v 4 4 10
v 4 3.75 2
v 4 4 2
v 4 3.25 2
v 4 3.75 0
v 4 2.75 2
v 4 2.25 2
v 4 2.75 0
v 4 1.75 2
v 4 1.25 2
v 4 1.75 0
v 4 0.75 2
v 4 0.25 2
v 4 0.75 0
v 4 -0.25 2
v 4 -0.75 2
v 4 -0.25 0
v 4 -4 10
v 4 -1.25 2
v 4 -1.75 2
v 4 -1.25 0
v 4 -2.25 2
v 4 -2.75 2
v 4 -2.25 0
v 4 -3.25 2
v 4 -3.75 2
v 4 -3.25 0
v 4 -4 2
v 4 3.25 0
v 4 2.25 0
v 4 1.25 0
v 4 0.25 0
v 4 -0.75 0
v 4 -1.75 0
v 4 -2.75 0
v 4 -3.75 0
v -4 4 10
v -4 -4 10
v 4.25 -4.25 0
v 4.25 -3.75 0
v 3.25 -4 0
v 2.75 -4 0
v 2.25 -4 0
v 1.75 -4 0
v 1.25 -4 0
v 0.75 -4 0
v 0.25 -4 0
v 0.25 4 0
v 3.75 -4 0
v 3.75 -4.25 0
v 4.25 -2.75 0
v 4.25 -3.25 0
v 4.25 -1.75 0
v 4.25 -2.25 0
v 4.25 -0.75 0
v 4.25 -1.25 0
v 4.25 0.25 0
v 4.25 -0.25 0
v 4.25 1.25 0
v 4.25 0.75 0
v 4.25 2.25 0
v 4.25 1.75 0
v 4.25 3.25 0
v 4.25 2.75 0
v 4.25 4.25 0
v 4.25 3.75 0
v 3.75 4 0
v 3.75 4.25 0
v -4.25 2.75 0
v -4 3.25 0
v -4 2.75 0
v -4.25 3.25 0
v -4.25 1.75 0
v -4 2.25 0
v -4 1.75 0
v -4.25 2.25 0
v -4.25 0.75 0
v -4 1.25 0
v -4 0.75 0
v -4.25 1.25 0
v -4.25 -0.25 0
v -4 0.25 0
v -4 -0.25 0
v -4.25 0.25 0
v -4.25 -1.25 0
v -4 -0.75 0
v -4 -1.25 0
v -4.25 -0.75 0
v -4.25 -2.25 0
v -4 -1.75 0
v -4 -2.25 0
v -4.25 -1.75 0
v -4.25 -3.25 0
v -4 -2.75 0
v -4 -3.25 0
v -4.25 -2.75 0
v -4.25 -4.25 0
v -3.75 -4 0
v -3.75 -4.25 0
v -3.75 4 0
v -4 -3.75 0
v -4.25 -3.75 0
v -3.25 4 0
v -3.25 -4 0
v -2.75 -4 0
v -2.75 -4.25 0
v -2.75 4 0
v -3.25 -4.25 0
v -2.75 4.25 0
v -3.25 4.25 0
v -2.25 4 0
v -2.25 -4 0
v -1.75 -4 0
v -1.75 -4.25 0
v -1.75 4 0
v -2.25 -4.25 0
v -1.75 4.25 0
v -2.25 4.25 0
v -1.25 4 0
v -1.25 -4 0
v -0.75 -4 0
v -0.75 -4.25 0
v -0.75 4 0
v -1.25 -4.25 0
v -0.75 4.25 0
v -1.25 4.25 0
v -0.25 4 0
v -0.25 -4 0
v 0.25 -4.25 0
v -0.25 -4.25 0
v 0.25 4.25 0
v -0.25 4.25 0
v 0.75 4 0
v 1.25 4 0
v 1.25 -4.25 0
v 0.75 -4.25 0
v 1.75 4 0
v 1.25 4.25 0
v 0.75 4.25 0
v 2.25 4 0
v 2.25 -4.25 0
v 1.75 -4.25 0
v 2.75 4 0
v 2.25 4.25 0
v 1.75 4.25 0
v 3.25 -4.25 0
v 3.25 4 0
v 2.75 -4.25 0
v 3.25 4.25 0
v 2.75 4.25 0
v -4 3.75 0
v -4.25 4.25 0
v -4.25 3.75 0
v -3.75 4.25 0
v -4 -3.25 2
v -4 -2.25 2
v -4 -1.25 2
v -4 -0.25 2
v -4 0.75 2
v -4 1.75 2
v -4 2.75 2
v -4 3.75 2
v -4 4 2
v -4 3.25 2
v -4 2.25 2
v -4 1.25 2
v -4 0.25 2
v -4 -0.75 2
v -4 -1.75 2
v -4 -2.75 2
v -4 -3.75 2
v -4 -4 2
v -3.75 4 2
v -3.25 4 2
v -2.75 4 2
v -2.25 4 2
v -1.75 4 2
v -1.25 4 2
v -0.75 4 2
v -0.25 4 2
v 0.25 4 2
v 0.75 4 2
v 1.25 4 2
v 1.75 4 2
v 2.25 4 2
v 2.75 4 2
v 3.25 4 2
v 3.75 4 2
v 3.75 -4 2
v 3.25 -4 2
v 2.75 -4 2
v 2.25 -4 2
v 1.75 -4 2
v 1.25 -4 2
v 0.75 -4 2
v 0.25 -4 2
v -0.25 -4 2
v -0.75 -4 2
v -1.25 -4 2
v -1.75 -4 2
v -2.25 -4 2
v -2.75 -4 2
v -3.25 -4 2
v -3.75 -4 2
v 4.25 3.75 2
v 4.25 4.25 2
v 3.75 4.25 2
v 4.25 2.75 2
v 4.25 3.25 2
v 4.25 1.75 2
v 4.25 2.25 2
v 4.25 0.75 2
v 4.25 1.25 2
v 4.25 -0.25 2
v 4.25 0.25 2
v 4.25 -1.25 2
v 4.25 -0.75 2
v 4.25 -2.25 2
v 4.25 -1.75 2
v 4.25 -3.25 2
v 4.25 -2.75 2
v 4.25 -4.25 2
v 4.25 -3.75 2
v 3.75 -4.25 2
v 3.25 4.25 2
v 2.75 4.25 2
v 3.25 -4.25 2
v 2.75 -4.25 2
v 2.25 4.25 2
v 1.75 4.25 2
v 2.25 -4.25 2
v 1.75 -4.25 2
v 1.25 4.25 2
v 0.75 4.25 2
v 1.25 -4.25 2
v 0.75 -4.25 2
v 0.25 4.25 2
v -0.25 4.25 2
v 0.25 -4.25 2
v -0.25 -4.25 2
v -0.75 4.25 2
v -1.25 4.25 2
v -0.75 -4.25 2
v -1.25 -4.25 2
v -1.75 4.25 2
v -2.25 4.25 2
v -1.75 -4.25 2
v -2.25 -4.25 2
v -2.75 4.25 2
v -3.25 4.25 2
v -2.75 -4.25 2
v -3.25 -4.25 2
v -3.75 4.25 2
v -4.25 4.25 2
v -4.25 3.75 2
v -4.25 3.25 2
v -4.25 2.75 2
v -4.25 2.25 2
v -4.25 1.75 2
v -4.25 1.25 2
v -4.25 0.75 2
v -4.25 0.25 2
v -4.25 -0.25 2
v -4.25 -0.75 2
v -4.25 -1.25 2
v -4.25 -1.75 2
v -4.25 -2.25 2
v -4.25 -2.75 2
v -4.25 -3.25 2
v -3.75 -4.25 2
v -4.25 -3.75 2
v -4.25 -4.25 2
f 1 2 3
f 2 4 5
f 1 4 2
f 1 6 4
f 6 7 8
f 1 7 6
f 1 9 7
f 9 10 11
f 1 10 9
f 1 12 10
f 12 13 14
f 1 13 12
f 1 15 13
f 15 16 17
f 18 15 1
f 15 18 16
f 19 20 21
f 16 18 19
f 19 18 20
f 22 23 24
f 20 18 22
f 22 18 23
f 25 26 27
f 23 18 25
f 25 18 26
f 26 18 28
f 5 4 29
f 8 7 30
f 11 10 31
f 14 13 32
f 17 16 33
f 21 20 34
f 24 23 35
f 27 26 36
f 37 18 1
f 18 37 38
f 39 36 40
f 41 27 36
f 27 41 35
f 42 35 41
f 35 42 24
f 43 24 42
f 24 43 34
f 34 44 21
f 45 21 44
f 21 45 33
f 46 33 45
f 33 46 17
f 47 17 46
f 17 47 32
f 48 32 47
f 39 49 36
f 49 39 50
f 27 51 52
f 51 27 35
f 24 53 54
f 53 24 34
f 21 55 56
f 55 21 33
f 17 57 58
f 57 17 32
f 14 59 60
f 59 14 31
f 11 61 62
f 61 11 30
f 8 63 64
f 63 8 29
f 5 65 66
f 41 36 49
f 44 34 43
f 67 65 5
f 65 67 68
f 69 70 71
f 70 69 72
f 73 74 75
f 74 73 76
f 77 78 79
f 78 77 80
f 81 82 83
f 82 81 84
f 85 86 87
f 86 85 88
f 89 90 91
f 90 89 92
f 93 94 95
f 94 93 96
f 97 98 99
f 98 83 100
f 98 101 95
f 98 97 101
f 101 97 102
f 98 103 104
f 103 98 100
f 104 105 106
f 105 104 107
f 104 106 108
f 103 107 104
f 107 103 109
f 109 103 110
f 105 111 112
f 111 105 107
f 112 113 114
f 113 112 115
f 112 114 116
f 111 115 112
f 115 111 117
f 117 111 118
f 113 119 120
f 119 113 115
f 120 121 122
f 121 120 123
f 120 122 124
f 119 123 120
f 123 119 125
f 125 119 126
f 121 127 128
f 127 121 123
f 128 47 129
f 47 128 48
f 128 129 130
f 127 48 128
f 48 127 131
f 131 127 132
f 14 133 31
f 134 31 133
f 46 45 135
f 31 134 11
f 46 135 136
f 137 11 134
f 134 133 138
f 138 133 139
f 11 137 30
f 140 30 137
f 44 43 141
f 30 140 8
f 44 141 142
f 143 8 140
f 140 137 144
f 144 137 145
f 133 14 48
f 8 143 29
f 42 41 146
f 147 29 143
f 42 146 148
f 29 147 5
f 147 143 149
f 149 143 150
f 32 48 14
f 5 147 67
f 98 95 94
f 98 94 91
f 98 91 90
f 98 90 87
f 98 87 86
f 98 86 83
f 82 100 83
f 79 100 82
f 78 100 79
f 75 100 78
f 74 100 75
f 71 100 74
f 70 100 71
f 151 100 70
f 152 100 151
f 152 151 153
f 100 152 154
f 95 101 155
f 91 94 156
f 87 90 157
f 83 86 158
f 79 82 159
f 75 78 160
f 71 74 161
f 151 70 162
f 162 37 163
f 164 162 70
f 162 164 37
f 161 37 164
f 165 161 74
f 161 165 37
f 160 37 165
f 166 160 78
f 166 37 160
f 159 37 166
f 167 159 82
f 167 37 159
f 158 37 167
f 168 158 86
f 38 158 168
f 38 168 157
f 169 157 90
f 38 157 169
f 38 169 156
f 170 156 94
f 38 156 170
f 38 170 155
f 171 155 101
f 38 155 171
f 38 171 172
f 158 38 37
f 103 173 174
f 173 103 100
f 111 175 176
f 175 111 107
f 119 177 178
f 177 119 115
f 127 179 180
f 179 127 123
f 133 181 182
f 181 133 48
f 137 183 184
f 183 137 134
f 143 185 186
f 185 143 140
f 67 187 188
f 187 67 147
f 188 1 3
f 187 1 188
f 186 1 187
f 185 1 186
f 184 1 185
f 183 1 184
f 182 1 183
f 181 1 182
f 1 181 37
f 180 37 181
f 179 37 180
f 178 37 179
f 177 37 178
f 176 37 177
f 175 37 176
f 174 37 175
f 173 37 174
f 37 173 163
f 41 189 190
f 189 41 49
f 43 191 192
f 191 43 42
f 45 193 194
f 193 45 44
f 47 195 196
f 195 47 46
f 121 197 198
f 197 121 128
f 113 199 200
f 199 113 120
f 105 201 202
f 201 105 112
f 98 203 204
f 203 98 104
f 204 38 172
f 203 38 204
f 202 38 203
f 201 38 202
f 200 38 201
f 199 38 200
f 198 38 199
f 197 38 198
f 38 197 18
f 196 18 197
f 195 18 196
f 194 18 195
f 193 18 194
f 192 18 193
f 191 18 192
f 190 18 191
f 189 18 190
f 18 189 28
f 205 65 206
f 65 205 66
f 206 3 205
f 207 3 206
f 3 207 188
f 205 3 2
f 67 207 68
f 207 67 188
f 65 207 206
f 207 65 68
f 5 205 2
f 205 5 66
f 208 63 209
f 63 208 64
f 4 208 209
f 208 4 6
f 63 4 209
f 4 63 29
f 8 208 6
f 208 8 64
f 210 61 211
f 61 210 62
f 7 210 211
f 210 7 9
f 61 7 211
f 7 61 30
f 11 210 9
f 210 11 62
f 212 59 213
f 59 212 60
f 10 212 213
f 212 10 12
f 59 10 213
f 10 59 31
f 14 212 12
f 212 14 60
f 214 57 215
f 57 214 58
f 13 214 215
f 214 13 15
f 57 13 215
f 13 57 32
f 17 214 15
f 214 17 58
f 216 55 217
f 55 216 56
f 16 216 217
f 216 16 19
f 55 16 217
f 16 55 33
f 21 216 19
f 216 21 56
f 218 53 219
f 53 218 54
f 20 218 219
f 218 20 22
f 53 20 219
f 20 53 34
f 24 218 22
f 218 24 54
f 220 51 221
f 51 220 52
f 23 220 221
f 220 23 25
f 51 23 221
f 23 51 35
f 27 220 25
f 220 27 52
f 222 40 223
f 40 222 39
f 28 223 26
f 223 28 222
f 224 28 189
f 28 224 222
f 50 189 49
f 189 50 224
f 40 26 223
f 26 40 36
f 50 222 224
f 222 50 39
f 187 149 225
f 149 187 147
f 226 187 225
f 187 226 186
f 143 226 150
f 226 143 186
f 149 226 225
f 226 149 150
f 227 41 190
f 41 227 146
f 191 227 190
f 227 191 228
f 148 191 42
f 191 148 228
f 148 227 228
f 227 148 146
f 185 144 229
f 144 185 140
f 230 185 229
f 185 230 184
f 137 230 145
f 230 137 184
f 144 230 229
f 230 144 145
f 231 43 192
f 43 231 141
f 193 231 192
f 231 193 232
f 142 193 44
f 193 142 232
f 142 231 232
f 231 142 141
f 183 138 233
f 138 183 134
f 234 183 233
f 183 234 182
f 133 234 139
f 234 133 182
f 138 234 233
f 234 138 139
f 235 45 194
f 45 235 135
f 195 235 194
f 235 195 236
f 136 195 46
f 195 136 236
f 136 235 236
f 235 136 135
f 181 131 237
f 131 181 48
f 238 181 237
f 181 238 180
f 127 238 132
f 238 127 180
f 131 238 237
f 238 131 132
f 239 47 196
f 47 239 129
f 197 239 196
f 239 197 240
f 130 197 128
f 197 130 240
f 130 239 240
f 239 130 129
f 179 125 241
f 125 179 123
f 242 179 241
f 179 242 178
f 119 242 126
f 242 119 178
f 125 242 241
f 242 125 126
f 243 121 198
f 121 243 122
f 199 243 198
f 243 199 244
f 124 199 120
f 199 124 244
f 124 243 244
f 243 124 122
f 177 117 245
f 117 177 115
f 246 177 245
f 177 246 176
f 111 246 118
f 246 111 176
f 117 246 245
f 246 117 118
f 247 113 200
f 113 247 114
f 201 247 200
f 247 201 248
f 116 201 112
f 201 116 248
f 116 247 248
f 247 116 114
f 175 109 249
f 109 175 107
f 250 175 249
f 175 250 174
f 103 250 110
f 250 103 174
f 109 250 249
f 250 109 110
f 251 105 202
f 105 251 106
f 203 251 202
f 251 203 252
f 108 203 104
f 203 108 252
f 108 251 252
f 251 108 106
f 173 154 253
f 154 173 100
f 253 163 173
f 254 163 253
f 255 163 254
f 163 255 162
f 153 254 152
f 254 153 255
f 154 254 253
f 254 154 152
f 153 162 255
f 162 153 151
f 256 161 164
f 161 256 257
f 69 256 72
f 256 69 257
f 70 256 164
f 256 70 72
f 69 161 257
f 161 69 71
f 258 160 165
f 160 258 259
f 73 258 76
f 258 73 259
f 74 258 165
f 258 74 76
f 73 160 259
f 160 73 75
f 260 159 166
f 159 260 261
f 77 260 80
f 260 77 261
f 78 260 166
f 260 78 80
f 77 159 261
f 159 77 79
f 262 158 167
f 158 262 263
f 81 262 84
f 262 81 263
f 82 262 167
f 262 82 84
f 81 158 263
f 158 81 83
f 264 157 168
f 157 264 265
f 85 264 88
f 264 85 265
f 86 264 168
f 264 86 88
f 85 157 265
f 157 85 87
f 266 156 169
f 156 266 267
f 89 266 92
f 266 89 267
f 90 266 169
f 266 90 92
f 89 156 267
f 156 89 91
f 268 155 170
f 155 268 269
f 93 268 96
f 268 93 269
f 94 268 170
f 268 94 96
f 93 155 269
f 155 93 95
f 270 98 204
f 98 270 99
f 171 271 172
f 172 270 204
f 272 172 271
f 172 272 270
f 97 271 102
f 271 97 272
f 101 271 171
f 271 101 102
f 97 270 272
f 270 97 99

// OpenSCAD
translate([0, 0, 5]) color([0,1,0,0.9]) cube([8, 8, 10], center=true);
translate([4.0, 4.0, 1]) color([1,0,0]) cube([0.5, 0.5, 2], center=true);
translate([4.0, 3.0, 1]) color([1,0,0]) cube([0.5, 0.5, 2], center=true);
translate([4.0, 2.0, 1]) color([1,0,0]) cube([0.5, 0.5, 2], center=true);
translate([4.0, 1.0, 1]) color([1,0,0]) cube([0.5, 0.5, 2], center=true);
translate([4.0, 0.0, 1]) color([1,0,0]) cube([0.5, 0.5, 2], center=true);
translate([4.0, -1.0, 1]) color([1,0,0]) cube([0.5, 0.5, 2], center=true);
translate([4.0, -2.0, 1]) color([1,0,0]) cube([0.5, 0.5, 2], center=true);
translate([4.0, -3.0, 1]) color([1,0,0]) cube([0.5, 0.5, 2], center=true);
translate([4.0, -4.0, 1]) color([1,0,0]) cube([0.5, 0.5, 2], center=true);
translate([3.0, 4.0, 1]) color([1,0,0]) cube([0.5, 0.5, 2], center=true);
translate([3.0, 3.0, 1]) color([1,0,0]) cube([0.5, 0.5, 2], center=true);
translate([3.0, 2.0, 1]) color([1,0,0]) cube([0.5, 0.5, 2], center=true);
translate([3.0, 1.0, 1]) color([1,0,0]) cube([0.5, 0.5, 2], center=true);
translate([3.0, 0.0, 1]) color([1,0,0]) cube([0.5, 0.5, 2], center=true);
translate([3.0, -1.0, 1]) color([1,0,0]) cube([0.5, 0.5, 2], center=true);
translate([3.0, -2.0, 1]) color([1,0,0]) cube([0.5, 0.5, 2], center=true);
translate([3.0, -3.0, 1]) color([1,0,0]) cube([0.5, 0.5, 2], center=true);
translate([3.0, -4.0, 1]) color([1,0,0]) cube([0.5, 0.5, 2], center=true);
translate([2.0, 4.0, 1]) color([1,0,0]) cube([0.5, 0.5, 2], center=true);
translate([2.0, 3.0, 1]) color([1,0,0]) cube([0.5, 0.5, 2], center=true);
translate([2.0, 2.0, 1]) color([1,0,0]) cube([0.5, 0.5, 2], center=true);
translate([2.0, 1.0, 1]) color([1,0,0]) cube([0.5, 0.5, 2], center=true);
translate([2.0, 0.0, 1]) color([1,0,0]) cube([0.5, 0.5, 2], center=true);
translate([2.0, -1.0, 1]) color([1,0,0]) cube([0.5, 0.5, 2], center=true);
translate([2.0, -2.0, 1]) color([1,0,0]) cube([0.5, 0.5, 2], center=true);
translate([2.0, -3.0, 1]) color([1,0,0]) cube([0.5, 0.5, 2], center=true);
translate([2.0, -4.0, 1]) color([1,0,0]) cube([0.5, 0.5, 2], center=true);
translate([1.0, 4.0, 1]) color([1,0,0]) cube([0.5, 0.5, 2], center=true);
translate([1.0, 3.0, 1]) color([1,0,0]) cube([0.5, 0.5, 2], center=true);
translate([1.0, 2.0, 1]) color([1,0,0]) cube([0.5, 0.5, 2], center=true);
translate([1.0, 1.0, 1]) color([1,0,0]) cube([0.5, 0.5, 2], center=true);
translate([1.0, 0.0, 1]) color([1,0,0]) cube([0.5, 0.5, 2], center=true);
translate([1.0, -1.0, 1]) color([1,0,0]) cube([0.5, 0.5, 2], center=true);
translate([1.0, -2.0, 1]) color([1,0,0]) cube([0.5, 0.5, 2], center=true);
translate([1.0, -3.0, 1]) color([1,0,0]) cube([0.5, 0.5, 2], center=true);
translate([1.0, -4.0, 1]) color([1,0,0]) cube([0.5, 0.5, 2], center=true);
translate([0.0, 4.0, 1]) color([1,0,0]) cube([0.5, 0.5, 2], center=true);
translate([0.0, 3.0, 1]) color([1,0,0]) cube([0.5, 0.5, 2], center=true);
translate([0.0, 2.0, 1]) color([1,0,0]) cube([0.5, 0.5, 2], center=true);
translate([0.0, 1.0, 1]) color([1,0,0]) cube([0.5, 0.5, 2], center=true);
translate([0.0, 0.0, 1]) color([1,0,0]) cube([0.5, 0.5, 2], center=true);
translate([0.0, -1.0, 1]) color([1,0,0]) cube([0.5, 0.5, 2], center=true);
translate([0.0, -2.0, 1]) color([1,0,0]) cube([0.5, 0.5, 2], center=true);
translate([0.0, -3.0, 1]) color([1,0,0]) cube([0.5, 0.5, 2], center=true);
translate([0.0, -4.0, 1]) color([1,0,0]) cube([0.5, 0.5, 2], center=true);
translate([-1.0, 4.0, 1]) color([1,0,0]) cube([0.5, 0.5, 2], center=true);
translate([-1.0, 3.0, 1]) color([1,0,0]) cube([0.5, 0.5, 2], center=true);
translate([-1.0, 2.0, 1]) color([1,0,0]) cube([0.5, 0.5, 2], center=true);
translate([-1.0, 1.0, 1]) color([1,0,0]) cube([0.5, 0.5, 2], center=true);
translate([-1.0, 0.0, 1]) color([1,0,0]) cube([0.5, 0.5, 2], center=true);
translate([-1.0, -1.0, 1]) color([1,0,0]) cube([0.5, 0.5, 2], center=true);
translate([-1.0, -2.0, 1]) color([1,0,0]) cube([0.5, 0.5, 2], center=true);
translate([-1.0, -3.0, 1]) color([1,0,0]) cube([0.5, 0.5, 2], center=true);
translate([-1.0, -4.0, 1]) color([1,0,0]) cube([0.5, 0.5, 2], center=true);
translate([-2.0, 4.0, 1]) color([1,0,0]) cube([0.5, 0.5, 2], center=true);
translate([-2.0, 3.0, 1]) color([1,0,0]) cube([0.5, 0.5, 2], center=true);
translate([-2.0, 2.0, 1]) color([1,0,0]) cube([0.5, 0.5, 2], center=true);
translate([-2.0, 1.0, 1]) color([1,0,0]) cube([0.5, 0.5, 2], center=true);
translate([-2.0, 0.0, 1]) color([1,0,0]) cube([0.5, 0.5, 2], center=true);
translate([-2.0, -1.0, 1]) color([1,0,0]) cube([0.5, 0.5, 2], center=true);
translate([-2.0, -2.0, 1]) color([1,0,0]) cube([0.5, 0.5, 2], center=true);
translate([-2.0, -3.0, 1]) color([1,0,0]) cube([0.5, 0.5, 2], center=true);
translate([-2.0, -4.0, 1]) color([1,0,0]) cube([0.5, 0.5, 2], center=true);
translate([-3.0, 4.0, 1]) color([1,0,0]) cube([0.5, 0.5, 2], center=true);
translate([-3.0, 3.0, 1]) color([1,0,0]) cube([0.5, 0.5, 2], center=true);
translate([-3.0, 2.0, 1]) color([1,0,0]) cube([0.5, 0.5, 2], center=true);
translate([-3.0, 1.0, 1]) color([1,0,0]) cube([0.5, 0.5, 2], center=true);
translate([-3.0, 0.0, 1]) color([1,0,0]) cube([0.5, 0.5, 2], center=true);
translate([-3.0, -1.0, 1]) color([1,0,0]) cube([0.5, 0.5, 2], center=true);
translate([-3.0, -2.0, 1]) color([1,0,0]) cube([0.5, 0.5, 2], center=true);
translate([-3.0, -3.0, 1]) color([1,0,0]) cube([0.5, 0.5, 2], center=true);
translate([-3.0, -4.0, 1]) color([1,0,0]) cube([0.5, 0.5, 2], center=true);
translate([-4.0, 4.0, 1]) color([1,0,0]) cube([0.5, 0.5, 2], center=true);
translate([-4.0, 3.0, 1]) color([1,0,0]) cube([0.5, 0.5, 2], center=true);
translate([-4.0, 2.0, 1]) color([1,0,0]) cube([0.5, 0.5, 2], center=true);
translate([-4.0, 1.0, 1]) color([1,0,0]) cube([0.5, 0.5, 2], center=true);
translate([-4.0, 0.0, 1]) color([1,0,0]) cube([0.5, 0.5, 2], center=true);
translate([-4.0, -1.0, 1]) color([1,0,0]) cube([0.5, 0.5, 2], center=true);
translate([-4.0, -2.0, 1]) color([1,0,0]) cube([0.5, 0.5, 2], center=true);
translate([-4.0, -3.0, 1]) color([1,0,0]) cube([0.5, 0.5, 2], center=true);
translate([-4.0, -4.0, 1]) color([1,0,0]) cube([0.5, 0.5, 2], center=true);
